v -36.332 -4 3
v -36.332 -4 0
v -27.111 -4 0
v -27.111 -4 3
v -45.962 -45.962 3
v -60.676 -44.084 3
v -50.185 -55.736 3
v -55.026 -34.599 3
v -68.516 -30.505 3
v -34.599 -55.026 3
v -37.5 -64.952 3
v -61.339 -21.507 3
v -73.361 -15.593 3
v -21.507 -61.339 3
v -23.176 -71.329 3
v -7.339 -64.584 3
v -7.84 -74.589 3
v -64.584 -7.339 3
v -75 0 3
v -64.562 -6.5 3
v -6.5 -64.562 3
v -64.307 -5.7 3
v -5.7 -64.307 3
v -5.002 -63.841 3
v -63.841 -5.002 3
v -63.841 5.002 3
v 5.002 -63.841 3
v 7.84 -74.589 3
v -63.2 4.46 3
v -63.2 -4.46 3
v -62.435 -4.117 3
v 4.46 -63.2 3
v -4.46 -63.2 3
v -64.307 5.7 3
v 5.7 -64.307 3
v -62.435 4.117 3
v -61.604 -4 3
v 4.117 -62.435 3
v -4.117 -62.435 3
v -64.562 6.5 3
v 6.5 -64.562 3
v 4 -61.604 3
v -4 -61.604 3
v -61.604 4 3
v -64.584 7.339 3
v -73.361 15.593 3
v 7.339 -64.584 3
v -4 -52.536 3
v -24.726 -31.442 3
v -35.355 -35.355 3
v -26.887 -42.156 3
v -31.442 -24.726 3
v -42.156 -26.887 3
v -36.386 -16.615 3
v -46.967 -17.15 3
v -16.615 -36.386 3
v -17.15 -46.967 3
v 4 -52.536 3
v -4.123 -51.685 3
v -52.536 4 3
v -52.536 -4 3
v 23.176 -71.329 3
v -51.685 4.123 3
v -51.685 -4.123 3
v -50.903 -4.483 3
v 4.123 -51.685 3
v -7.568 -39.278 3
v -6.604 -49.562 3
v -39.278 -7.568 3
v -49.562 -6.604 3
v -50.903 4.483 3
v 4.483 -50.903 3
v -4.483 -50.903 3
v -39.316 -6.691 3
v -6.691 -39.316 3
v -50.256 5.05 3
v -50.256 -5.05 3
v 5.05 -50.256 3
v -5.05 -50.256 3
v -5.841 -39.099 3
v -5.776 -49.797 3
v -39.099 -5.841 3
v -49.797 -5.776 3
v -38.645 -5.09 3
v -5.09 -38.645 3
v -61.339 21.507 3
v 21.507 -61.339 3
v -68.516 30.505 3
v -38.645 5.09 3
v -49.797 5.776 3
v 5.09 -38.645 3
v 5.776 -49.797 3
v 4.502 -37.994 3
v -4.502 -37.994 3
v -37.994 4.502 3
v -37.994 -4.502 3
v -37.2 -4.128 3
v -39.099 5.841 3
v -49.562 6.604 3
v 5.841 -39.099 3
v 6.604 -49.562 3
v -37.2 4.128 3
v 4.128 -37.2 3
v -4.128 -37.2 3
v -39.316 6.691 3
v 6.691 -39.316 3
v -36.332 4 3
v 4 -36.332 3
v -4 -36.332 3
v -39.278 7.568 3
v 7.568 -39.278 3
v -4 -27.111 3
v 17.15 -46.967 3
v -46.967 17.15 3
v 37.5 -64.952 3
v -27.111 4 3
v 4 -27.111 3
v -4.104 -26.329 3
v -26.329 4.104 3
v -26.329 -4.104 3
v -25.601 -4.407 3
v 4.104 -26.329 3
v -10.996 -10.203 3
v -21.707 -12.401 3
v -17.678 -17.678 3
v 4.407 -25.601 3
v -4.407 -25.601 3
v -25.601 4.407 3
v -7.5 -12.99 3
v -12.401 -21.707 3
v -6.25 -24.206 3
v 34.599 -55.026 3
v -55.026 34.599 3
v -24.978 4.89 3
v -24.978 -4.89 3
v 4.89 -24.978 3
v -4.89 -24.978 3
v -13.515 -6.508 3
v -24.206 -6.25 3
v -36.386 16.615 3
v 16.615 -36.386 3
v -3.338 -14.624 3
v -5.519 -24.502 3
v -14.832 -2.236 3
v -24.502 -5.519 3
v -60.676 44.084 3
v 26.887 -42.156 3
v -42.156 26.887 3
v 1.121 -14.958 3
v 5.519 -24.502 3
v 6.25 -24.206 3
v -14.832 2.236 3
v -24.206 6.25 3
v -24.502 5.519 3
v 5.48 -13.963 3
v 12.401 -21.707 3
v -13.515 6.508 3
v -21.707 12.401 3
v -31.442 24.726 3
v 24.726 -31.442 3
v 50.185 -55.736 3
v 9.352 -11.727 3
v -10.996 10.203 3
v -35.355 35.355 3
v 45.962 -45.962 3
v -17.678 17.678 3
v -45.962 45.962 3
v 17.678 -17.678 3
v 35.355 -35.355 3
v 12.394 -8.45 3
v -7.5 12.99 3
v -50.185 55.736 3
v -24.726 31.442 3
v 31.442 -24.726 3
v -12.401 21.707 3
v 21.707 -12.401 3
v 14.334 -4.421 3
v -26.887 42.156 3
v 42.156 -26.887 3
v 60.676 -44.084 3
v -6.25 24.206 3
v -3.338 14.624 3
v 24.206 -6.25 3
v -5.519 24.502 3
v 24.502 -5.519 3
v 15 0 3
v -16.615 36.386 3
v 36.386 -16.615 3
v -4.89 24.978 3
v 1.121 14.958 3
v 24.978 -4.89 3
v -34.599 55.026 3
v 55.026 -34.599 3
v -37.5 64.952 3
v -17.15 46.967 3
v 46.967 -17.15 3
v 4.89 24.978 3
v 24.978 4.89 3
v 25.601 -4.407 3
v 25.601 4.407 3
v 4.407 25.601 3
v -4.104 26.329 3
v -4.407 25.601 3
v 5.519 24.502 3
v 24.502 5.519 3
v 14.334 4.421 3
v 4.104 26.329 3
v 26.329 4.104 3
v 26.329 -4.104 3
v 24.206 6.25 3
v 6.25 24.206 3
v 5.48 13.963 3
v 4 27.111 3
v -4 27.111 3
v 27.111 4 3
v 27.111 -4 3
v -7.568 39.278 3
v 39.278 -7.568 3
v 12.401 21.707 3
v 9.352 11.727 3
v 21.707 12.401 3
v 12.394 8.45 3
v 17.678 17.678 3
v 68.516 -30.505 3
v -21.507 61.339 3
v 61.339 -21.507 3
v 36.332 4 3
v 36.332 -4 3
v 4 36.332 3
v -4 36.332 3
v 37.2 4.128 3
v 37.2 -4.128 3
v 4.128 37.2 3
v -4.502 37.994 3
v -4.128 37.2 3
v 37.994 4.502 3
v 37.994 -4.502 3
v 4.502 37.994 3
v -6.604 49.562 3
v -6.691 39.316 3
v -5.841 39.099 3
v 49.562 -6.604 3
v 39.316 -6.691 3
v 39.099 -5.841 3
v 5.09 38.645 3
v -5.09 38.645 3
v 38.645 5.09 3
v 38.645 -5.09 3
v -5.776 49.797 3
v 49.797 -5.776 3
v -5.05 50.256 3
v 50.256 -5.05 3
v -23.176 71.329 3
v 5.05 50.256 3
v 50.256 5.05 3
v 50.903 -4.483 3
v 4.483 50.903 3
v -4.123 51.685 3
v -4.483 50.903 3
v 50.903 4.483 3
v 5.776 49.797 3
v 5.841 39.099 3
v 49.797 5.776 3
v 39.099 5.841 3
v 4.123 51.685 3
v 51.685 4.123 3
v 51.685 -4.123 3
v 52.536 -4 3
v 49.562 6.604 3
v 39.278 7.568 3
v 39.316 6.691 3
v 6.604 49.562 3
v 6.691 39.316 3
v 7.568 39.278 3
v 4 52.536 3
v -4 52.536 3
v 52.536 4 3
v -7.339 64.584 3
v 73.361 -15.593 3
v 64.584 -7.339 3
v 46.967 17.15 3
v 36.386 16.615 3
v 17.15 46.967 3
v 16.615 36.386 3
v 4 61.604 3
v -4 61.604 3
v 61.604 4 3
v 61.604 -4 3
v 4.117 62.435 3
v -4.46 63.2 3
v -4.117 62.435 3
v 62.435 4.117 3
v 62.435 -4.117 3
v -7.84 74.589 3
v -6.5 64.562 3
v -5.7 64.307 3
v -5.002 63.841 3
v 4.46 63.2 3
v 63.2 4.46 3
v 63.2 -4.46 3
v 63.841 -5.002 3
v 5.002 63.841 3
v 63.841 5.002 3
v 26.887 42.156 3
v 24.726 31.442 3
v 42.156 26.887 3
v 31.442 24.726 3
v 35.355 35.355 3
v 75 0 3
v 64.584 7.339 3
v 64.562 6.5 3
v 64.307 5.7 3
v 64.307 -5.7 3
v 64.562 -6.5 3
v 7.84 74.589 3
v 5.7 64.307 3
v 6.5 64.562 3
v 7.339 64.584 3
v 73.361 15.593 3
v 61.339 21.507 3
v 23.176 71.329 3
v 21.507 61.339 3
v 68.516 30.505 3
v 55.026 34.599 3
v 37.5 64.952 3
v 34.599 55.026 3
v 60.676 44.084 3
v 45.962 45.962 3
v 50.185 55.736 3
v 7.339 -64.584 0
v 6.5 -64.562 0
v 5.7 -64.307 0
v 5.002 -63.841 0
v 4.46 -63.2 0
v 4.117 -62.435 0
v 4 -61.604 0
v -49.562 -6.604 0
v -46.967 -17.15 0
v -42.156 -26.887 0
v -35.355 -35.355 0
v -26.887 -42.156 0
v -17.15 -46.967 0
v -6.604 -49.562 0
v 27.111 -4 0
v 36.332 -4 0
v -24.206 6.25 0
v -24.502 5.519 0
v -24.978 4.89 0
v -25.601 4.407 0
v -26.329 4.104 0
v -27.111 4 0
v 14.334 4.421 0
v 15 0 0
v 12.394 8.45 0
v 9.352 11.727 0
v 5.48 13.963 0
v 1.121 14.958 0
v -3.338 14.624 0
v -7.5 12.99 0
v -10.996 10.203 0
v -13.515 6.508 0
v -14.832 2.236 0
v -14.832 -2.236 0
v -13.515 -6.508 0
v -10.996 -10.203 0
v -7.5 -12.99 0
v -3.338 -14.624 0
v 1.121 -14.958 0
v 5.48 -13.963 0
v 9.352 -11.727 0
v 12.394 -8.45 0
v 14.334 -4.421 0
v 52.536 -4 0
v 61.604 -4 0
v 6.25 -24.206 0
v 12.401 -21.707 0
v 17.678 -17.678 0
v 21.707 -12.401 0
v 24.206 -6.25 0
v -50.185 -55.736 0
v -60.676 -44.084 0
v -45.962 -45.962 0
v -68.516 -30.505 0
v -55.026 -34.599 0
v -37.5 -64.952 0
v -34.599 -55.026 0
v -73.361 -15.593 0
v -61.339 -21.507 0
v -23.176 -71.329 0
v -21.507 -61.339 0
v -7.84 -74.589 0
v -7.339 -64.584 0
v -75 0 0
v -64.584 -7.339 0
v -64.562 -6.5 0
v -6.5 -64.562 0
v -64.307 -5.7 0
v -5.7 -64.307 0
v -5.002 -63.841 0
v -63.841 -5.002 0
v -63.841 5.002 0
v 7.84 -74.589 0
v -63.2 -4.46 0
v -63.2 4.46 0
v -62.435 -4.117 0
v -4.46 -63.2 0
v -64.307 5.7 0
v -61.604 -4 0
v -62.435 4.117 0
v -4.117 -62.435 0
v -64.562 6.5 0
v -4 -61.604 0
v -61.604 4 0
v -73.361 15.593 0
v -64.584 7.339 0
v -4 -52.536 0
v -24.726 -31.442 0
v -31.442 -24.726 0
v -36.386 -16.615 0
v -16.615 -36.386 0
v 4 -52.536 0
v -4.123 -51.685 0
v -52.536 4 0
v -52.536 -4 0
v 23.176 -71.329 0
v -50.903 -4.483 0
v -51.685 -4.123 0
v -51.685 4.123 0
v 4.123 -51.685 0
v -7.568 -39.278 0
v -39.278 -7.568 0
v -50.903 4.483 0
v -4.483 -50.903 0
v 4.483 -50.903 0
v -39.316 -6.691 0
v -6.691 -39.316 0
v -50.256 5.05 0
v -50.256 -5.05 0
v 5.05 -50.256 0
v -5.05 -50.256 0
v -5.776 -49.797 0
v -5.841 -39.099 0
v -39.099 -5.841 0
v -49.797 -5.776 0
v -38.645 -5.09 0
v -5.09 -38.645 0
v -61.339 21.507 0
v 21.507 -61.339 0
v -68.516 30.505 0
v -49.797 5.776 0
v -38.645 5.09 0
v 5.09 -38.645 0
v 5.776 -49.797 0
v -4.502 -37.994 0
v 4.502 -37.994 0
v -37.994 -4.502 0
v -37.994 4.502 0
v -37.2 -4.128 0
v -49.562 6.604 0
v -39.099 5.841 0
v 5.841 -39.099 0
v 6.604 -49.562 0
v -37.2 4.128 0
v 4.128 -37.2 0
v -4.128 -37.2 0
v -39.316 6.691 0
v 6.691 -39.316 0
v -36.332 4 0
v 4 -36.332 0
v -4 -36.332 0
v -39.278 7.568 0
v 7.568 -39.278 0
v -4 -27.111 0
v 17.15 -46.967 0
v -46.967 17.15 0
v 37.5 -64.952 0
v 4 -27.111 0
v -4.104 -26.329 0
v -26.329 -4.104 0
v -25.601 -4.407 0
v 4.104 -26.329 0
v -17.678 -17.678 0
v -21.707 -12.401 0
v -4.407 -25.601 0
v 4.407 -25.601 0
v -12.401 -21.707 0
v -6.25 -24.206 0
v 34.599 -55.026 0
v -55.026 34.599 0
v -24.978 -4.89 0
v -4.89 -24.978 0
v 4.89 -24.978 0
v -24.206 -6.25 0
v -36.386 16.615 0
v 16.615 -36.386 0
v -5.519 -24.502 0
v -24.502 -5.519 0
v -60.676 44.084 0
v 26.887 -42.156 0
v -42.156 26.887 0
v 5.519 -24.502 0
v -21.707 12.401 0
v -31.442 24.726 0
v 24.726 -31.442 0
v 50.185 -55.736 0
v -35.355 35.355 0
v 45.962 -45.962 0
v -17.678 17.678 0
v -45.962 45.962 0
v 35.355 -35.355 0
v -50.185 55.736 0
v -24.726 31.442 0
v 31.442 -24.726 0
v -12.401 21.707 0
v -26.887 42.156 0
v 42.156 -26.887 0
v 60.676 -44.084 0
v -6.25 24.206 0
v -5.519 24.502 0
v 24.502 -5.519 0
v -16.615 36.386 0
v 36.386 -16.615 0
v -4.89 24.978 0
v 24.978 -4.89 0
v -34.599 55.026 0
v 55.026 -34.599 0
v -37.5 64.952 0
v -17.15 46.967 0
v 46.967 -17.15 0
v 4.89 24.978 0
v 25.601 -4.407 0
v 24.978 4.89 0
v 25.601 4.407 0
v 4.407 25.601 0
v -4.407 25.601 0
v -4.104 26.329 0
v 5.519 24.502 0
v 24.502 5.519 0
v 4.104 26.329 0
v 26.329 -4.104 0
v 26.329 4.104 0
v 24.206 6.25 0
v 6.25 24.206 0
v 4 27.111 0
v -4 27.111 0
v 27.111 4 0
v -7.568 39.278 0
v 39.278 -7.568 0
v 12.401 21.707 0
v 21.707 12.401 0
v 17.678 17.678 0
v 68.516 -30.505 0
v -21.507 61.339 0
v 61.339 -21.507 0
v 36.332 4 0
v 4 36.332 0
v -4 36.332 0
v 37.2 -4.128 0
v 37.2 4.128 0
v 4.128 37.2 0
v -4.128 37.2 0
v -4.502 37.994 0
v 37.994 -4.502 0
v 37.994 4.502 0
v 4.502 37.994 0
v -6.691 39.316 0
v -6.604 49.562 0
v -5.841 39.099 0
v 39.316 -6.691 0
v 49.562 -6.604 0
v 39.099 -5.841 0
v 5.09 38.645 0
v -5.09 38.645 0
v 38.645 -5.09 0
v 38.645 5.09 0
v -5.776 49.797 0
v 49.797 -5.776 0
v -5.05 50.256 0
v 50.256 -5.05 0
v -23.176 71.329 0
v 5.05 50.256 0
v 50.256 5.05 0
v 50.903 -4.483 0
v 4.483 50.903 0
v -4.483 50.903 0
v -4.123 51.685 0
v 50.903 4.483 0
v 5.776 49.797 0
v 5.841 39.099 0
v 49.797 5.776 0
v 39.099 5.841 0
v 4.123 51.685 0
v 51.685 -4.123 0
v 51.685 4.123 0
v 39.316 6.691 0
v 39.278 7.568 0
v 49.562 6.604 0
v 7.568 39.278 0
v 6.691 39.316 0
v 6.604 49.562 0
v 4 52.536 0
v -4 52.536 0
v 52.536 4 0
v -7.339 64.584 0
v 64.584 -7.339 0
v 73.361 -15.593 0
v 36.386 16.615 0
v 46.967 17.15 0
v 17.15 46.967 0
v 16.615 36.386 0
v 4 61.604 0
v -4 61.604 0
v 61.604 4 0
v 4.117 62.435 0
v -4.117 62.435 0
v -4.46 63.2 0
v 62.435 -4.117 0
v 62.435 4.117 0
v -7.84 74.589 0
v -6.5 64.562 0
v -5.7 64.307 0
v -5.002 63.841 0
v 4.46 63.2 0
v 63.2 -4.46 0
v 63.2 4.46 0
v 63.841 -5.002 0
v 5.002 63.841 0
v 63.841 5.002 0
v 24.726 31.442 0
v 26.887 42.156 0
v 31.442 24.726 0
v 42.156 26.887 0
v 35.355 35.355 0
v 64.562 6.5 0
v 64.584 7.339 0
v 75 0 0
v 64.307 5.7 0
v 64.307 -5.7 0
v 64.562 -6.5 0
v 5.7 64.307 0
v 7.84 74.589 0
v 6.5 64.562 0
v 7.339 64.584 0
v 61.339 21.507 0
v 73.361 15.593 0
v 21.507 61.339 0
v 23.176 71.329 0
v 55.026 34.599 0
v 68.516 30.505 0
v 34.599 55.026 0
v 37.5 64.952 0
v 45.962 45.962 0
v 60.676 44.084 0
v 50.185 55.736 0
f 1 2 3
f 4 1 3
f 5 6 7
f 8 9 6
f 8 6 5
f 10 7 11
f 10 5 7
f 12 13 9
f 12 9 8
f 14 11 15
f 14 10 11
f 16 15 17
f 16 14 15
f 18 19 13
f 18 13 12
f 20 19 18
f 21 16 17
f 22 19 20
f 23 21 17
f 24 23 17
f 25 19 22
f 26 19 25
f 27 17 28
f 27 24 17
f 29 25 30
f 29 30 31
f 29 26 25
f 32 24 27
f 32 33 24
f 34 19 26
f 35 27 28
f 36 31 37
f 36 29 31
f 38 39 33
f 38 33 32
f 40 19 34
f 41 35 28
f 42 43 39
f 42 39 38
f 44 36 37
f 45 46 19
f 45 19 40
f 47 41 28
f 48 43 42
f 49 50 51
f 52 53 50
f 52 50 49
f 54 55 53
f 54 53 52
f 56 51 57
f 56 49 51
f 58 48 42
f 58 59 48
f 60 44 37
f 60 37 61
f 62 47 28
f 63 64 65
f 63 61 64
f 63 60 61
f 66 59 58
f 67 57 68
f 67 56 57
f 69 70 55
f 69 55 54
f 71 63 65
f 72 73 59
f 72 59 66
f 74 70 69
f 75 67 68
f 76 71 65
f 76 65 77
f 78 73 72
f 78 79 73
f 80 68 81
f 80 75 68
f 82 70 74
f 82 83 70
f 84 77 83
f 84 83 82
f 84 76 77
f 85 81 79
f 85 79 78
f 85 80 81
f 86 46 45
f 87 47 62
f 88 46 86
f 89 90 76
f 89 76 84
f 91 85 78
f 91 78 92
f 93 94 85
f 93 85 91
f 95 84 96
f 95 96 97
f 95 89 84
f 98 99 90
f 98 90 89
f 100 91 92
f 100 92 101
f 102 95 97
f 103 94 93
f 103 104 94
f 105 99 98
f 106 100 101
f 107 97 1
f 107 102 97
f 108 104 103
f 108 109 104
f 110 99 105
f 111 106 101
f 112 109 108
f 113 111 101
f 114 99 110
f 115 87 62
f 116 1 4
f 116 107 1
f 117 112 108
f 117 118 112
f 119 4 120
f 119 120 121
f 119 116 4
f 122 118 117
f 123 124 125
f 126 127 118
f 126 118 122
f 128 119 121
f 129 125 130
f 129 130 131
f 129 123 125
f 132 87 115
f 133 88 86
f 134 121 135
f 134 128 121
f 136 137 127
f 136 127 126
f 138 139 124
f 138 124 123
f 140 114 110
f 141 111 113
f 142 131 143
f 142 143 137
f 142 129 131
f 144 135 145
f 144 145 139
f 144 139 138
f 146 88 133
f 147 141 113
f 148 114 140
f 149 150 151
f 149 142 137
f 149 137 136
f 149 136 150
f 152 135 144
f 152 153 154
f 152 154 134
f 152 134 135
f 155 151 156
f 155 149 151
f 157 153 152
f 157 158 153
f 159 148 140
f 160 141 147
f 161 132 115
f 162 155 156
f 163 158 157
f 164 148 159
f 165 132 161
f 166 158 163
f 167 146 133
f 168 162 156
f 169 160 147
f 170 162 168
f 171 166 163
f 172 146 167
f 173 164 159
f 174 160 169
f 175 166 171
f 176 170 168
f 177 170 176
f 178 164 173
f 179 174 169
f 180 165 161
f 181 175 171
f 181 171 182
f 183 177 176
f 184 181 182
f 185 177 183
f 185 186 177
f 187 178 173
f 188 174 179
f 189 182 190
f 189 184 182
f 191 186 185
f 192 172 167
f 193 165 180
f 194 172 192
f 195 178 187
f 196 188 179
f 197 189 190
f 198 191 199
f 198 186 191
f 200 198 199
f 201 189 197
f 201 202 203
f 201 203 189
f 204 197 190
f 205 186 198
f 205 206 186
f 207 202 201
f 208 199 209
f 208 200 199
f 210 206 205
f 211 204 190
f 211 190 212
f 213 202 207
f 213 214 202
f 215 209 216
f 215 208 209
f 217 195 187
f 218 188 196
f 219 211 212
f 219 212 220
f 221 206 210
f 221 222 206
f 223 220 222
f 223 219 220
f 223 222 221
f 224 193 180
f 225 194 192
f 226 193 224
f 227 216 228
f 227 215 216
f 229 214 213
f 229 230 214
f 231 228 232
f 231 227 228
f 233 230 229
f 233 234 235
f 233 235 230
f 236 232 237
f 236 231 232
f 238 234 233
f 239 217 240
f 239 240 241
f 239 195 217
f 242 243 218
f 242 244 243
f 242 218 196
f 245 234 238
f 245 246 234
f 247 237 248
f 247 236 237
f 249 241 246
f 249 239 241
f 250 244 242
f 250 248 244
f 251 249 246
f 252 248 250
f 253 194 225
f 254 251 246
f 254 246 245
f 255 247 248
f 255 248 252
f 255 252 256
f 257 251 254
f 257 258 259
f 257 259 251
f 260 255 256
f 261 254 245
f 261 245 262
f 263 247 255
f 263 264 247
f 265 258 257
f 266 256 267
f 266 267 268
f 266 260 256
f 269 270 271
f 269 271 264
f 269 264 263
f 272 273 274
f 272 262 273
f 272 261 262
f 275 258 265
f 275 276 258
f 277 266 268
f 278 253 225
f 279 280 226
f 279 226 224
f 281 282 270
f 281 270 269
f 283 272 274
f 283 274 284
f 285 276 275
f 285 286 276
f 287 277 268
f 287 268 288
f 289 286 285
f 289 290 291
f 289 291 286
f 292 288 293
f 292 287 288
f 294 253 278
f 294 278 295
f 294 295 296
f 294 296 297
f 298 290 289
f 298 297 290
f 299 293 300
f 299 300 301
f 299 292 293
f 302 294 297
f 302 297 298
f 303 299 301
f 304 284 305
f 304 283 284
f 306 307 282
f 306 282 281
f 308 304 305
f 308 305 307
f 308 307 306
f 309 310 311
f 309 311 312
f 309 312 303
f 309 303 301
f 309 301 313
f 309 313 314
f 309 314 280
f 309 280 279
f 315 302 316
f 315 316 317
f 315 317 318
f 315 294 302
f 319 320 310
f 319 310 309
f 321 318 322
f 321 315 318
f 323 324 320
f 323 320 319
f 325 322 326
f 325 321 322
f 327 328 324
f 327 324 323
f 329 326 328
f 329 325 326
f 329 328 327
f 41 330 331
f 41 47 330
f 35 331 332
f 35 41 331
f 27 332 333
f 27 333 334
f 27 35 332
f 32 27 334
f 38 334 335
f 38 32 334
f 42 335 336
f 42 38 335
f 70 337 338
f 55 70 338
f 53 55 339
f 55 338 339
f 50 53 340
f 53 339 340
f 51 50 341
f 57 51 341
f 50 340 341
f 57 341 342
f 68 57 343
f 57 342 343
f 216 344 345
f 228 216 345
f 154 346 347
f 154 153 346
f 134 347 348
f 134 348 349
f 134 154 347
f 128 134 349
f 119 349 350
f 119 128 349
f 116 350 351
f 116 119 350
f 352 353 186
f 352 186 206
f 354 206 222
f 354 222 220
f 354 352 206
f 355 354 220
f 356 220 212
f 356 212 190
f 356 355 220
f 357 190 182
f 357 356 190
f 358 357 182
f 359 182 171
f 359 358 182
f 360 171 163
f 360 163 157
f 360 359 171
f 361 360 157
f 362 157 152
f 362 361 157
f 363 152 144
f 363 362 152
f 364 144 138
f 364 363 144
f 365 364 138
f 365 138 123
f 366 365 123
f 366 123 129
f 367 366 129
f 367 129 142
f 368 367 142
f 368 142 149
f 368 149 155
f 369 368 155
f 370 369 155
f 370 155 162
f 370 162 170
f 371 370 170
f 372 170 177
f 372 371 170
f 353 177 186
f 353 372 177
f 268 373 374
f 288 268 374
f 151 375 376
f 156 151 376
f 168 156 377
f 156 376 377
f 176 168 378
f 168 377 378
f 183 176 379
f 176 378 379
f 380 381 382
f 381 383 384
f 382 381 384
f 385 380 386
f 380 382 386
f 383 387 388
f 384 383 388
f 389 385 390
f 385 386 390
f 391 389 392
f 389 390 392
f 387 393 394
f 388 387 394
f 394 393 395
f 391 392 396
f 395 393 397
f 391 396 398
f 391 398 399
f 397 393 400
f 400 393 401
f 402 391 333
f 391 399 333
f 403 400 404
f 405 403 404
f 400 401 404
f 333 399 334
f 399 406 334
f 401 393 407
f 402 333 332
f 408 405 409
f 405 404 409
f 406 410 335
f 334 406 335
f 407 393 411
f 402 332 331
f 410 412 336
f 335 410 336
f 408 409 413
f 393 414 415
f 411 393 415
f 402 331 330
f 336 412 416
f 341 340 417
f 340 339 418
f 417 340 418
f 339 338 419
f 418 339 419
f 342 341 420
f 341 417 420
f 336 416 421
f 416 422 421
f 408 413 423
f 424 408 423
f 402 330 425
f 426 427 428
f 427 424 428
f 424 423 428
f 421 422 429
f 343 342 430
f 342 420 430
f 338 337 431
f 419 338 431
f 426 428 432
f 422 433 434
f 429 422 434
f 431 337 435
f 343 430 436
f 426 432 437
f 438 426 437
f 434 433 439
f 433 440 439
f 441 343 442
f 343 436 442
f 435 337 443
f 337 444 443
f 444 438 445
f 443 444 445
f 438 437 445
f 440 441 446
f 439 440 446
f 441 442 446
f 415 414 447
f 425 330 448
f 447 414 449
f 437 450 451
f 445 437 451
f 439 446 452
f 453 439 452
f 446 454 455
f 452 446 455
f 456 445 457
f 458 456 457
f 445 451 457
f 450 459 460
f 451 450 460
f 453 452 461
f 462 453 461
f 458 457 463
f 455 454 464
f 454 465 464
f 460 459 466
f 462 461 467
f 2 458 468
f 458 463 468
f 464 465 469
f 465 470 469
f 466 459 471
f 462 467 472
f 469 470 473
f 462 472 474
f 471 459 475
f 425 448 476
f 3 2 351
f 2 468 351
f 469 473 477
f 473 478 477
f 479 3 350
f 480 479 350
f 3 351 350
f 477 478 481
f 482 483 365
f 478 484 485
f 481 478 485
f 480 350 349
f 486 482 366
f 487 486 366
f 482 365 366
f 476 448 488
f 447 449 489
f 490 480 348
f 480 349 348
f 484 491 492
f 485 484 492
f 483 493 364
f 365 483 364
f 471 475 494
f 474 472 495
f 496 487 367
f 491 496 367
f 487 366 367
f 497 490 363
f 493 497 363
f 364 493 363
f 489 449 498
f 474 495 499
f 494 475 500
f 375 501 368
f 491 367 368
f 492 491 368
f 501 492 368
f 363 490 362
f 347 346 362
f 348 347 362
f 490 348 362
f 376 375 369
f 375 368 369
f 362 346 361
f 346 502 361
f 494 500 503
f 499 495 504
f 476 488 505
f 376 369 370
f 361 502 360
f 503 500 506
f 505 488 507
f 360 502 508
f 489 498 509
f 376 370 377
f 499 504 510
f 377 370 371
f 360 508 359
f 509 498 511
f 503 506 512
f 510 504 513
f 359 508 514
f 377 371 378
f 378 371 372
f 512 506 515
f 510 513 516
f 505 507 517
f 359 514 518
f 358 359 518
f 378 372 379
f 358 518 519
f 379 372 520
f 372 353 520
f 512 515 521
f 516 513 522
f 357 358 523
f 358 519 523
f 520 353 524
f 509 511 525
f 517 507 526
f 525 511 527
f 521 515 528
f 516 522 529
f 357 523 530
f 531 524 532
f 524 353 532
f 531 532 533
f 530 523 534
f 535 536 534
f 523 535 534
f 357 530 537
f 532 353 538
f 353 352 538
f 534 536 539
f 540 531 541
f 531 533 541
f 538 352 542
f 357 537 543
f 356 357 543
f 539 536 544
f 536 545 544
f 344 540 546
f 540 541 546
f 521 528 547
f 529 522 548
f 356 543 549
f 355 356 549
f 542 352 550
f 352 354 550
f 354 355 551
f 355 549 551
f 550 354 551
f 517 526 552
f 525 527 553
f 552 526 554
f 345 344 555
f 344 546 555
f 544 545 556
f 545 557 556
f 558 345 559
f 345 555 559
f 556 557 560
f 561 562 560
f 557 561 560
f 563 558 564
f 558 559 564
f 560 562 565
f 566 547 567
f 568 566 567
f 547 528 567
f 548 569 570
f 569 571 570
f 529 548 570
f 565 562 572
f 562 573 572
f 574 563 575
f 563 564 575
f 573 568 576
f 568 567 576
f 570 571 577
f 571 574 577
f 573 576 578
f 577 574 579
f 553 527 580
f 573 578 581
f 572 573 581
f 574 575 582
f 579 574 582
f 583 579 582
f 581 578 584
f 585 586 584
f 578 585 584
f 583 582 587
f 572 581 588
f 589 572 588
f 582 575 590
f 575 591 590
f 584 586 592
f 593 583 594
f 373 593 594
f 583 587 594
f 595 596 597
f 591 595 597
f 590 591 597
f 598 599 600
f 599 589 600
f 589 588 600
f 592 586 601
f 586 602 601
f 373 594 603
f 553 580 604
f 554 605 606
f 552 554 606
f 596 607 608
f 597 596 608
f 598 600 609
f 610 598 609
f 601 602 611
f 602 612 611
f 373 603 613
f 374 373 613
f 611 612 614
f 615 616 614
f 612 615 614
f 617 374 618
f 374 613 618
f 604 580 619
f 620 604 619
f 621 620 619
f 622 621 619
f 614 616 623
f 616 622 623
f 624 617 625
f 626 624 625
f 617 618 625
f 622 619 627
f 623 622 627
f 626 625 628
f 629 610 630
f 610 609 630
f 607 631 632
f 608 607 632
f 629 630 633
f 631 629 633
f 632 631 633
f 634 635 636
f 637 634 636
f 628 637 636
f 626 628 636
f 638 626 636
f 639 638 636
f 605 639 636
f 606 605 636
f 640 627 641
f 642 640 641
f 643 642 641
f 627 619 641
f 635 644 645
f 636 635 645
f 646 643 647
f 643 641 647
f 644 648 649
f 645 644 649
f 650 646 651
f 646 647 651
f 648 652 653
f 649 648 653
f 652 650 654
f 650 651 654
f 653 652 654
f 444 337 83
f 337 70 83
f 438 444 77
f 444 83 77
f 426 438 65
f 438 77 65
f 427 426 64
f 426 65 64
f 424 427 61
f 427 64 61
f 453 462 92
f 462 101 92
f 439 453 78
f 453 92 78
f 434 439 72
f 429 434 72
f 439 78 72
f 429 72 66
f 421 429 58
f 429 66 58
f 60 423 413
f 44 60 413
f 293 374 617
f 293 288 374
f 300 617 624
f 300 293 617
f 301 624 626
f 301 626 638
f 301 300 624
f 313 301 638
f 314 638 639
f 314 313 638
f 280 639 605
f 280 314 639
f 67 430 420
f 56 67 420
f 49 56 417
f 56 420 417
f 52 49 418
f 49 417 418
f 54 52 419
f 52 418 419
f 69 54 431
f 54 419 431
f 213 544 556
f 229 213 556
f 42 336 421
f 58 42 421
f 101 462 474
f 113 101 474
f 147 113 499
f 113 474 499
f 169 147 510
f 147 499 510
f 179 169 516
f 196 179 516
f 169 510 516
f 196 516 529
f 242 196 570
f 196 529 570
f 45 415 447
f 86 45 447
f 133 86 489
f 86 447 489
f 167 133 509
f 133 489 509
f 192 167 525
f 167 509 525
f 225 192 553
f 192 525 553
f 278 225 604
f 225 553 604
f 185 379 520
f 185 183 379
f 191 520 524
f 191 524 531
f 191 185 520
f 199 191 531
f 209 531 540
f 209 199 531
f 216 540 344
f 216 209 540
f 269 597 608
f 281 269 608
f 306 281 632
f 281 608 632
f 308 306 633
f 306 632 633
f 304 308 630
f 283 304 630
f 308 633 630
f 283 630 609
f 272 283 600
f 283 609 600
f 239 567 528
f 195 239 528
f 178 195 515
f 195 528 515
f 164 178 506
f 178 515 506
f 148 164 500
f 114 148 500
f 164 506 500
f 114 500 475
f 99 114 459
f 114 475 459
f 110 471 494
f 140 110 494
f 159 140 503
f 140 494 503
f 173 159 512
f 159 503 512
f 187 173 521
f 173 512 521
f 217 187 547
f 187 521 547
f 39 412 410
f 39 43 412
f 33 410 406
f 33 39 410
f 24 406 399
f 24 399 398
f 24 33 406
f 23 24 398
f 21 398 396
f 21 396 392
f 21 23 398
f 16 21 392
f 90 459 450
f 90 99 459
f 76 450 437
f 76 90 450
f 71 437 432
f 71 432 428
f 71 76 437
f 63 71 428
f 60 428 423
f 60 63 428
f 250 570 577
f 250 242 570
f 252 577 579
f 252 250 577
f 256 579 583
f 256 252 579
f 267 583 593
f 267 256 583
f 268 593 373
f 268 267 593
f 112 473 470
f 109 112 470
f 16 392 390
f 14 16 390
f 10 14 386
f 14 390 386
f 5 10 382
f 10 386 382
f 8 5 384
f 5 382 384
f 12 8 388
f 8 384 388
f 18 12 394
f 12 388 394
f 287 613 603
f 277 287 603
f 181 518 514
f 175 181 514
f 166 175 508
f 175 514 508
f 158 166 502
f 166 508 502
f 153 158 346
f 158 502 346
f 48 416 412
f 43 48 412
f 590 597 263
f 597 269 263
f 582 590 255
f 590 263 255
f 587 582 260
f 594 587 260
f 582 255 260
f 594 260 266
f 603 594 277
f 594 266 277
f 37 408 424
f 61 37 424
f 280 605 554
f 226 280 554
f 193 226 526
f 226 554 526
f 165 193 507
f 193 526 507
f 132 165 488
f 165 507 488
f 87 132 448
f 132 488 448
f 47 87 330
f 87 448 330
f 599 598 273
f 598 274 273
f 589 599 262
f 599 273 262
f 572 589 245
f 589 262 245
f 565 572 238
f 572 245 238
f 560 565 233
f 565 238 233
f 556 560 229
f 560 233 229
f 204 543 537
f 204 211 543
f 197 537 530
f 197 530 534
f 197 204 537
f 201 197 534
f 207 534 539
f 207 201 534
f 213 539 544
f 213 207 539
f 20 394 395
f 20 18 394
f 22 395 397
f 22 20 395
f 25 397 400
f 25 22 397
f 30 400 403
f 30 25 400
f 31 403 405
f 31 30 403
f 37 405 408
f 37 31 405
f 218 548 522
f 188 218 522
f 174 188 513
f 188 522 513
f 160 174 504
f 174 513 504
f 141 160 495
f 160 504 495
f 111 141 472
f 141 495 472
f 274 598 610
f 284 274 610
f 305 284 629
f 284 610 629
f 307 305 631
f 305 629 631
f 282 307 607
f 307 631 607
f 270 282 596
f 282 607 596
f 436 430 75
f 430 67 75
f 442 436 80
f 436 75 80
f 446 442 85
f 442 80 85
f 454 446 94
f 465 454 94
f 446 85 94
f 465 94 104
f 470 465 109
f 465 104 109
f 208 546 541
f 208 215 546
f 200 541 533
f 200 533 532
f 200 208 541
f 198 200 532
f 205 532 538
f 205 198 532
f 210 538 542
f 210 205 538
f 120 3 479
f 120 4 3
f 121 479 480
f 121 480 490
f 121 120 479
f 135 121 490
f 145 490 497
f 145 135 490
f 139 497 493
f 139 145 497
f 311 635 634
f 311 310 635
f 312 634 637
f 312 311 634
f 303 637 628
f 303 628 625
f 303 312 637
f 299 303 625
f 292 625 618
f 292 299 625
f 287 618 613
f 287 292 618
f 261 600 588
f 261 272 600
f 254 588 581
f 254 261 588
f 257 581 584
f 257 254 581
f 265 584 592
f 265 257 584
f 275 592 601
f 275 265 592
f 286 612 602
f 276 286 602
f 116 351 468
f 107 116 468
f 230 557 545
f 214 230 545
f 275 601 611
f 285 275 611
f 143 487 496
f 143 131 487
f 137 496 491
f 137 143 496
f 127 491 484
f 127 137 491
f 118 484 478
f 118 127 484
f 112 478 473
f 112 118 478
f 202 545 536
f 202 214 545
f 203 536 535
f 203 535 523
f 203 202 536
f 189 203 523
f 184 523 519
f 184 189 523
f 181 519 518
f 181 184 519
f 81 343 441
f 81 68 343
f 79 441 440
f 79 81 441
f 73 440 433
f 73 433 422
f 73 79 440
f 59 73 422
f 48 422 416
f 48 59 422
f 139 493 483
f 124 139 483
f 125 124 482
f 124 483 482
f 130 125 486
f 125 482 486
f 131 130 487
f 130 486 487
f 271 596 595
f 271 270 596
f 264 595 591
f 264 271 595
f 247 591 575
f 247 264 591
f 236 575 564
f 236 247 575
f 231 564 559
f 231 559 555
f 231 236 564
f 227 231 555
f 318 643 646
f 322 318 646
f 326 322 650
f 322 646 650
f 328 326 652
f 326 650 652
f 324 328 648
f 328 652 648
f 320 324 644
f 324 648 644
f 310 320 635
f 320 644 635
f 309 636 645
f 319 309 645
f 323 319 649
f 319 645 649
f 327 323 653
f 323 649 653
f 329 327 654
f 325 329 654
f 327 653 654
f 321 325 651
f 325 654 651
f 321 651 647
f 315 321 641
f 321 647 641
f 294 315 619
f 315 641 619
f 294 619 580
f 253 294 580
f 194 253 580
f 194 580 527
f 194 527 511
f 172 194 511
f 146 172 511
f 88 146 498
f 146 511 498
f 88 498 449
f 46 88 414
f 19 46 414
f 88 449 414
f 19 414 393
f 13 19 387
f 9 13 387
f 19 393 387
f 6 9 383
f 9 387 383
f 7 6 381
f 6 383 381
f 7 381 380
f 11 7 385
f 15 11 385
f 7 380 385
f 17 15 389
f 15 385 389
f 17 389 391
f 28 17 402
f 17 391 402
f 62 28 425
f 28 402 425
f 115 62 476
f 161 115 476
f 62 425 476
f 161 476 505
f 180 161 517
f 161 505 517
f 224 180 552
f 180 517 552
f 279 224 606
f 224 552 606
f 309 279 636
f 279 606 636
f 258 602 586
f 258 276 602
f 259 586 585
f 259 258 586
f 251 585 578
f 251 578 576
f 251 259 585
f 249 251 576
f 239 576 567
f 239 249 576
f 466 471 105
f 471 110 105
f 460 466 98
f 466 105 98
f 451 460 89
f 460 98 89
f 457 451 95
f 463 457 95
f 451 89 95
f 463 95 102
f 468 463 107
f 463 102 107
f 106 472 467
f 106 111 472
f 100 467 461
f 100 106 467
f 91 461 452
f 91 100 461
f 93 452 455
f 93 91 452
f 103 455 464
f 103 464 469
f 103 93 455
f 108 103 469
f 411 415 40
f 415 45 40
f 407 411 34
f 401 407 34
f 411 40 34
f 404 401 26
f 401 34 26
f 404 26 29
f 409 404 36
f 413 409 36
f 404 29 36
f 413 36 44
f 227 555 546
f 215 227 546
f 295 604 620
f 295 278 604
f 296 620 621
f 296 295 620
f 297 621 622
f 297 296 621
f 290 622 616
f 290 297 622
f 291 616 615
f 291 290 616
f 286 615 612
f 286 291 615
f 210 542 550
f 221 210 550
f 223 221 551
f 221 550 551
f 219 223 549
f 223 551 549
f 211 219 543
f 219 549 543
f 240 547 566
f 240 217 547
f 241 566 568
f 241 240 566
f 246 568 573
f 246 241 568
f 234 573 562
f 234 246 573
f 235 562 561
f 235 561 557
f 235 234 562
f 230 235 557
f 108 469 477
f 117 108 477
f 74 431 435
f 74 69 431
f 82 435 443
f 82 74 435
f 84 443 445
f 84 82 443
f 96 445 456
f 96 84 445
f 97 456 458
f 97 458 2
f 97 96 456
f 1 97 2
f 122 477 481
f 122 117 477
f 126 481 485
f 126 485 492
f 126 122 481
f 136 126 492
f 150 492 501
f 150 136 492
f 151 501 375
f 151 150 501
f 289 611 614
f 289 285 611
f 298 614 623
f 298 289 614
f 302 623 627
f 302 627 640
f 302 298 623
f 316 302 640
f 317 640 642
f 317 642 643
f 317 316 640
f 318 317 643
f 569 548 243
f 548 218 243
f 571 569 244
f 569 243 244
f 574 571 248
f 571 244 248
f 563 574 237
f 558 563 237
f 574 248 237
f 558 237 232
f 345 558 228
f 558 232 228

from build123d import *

# Parameters (mm, degrees)
F0_R     = 75
F0_R_2   = 15
F1_DEPTH = 3
F2_R     = 3


with BuildPart() as f1:
    # F0 (on Top) → F1 (new body)
    with BuildSketch(Plane.XY):
        Circle(F0_R)
        with BuildLine():
            ThreePointArc((4, 64.876806), (45.961941, 45.961941), (64.876806, 4))
            ThreePointArc((64.876806, 4), (64.969194, 2.000948), (65, 0))
            ThreePointArc((65, 0), (64.969194, -2.000948), (64.876806, -4))
            ThreePointArc((64.876806, -4), (45.961941, -45.961941), (4, -64.876806))
            ThreePointArc((4, -64.876806), (0, -65), (-4, -64.876806))
            ThreePointArc((-4, -64.876806), (-45.961941, -45.961941), (-64.876806, -4))
            ThreePointArc((-64.876806, -4), (-65, 0), (-64.876806, 4))
            ThreePointArc((-64.876806, 4), (-45.961941, 45.961941), (-4, 64.876806))
            ThreePointArc((-4, 64.876806), (0, 65), (4, 64.876806))
        make_face(mode=Mode.SUBTRACT)
        with BuildLine():
            ThreePointArc((-4, 49.839743), (0, 50), (4, 49.839743))
            Line((4, 49.839743), (4, 64.876806))
            ThreePointArc((4, 64.876806), (0, 65), (-4, 64.876806))
            Line((-4, 64.876806), (-4, 49.839743))
        make_face()
        with BuildLine():
            ThreePointArc((49.839743, -4), (49.95992, -2.001604), (50, 0))
            ThreePointArc((50, 0), (49.95992, 2.001604), (49.839743, 4))
            ThreePointArc((49.839743, 4), (35.355339, 35.355339), (4, 49.839743))
            ThreePointArc((4, 49.839743), (0, 50), (-4, 49.839743))
            ThreePointArc((-4, 49.839743), (-35.355339, 35.355339), (-49.839743, 4))
            ThreePointArc((-49.839743, 4), (-50, 0), (-49.839743, -4))
            ThreePointArc((-49.839743, -4), (-35.355339, -35.355339), (-4, -49.839743))
            ThreePointArc((-4, -49.839743), (0, -50), (4, -49.839743))
            ThreePointArc((4, -49.839743), (35.355339, -35.355339), (49.839743, -4))
        make_face()
        with BuildLine():
            ThreePointArc((39.799497, 4), (39.949843, 2.002511), (40, 0))
            ThreePointArc((40, 0), (39.949843, -2.002511), (39.799497, -4))
            ThreePointArc((39.799497, -4), (28.284271, -28.284271), (4, -39.799497))
            ThreePointArc((4, -39.799497), (0, -40), (-4, -39.799497))
            ThreePointArc((-4, -39.799497), (-28.284271, -28.284271), (-39.799497, -4))
            ThreePointArc((-39.799497, -4), (-40, 0), (-39.799497, 4))
            ThreePointArc((-39.799497, 4), (-28.284271, 28.284271), (-4, 39.799497))
            ThreePointArc((-4, 39.799497), (0, 40), (4, 39.799497))
            ThreePointArc((4, 39.799497), (28.284271, 28.284271), (39.799497, 4))
        make_face(mode=Mode.SUBTRACT)
        with BuildLine():
            Line((4, 24.677925), (4, 39.799497))
            ThreePointArc((4, 39.799497), (0, 40), (-4, 39.799497))
            Line((-4, 39.799497), (-4, 24.677925))
            ThreePointArc((-4, 24.677925), (0, 25), (4, 24.677925))
        make_face()
        with BuildLine():
            ThreePointArc((25, 0), (24.919351, 2.006473), (24.677925, 4))
            ThreePointArc((24.677925, 4), (17.67767, 17.67767), (4, 24.677925))
            ThreePointArc((4, 24.677925), (0, 25), (-4, 24.677925))
            ThreePointArc((-4, 24.677925), (-17.67767, 17.67767), (-24.677925, 4))
            ThreePointArc((-24.677925, 4), (-25, 0), (-24.677925, -4))
            ThreePointArc((-24.677925, -4), (-17.67767, -17.67767), (-4, -24.677925))
            ThreePointArc((-4, -24.677925), (0, -25), (4, -24.677925))
            ThreePointArc((4, -24.677925), (17.67767, -17.67767), (24.677925, -4))
            ThreePointArc((24.677925, -4), (24.919351, -2.006473), (25, 0))
        make_face()
        Circle(F0_R_2, mode=Mode.SUBTRACT)
        with BuildLine():
            Line((-24.677925, 4), (-39.799497, 4))
            ThreePointArc((-39.799497, 4), (-40, 0), (-39.799497, -4))
            Line((-39.799497, -4), (-24.677925, -4))
            ThreePointArc((-24.677925, -4), (-25, 0), (-24.677925, 4))
        make_face()
        with BuildLine():
            ThreePointArc((-49.839743, -4), (-50, 0), (-49.839743, 4))
            Line((-49.839743, 4), (-64.876806, 4))
            ThreePointArc((-64.876806, 4), (-65, 0), (-64.876806, -4))
            Line((-64.876806, -4), (-49.839743, -4))
        make_face()
        with BuildLine():
            ThreePointArc((-4, -39.799497), (0, -40), (4, -39.799497))
            Line((4, -39.799497), (4, -24.677925))
            ThreePointArc((4, -24.677925), (0, -25), (-4, -24.677925))
            Line((-4, -24.677925), (-4, -39.799497))
        make_face()
        with BuildLine():
            Line((4, -64.876806), (4, -49.839743))
            ThreePointArc((4, -49.839743), (0, -50), (-4, -49.839743))
            Line((-4, -49.839743), (-4, -64.876806))
            ThreePointArc((-4, -64.876806), (0, -65), (4, -64.876806))
        make_face()
        with BuildLine():
            ThreePointArc((39.799497, -4), (39.949843, -2.002511), (40, 0))
            ThreePointArc((40, 0), (39.949843, 2.002511), (39.799497, 4))
            Line((39.799497, 4), (24.677925, 4))
            ThreePointArc((24.677925, 4), (24.919351, 2.006473), (25, 0))
            ThreePointArc((25, 0), (24.919351, -2.006473), (24.677925, -4))
            Line((24.677925, -4), (39.799497, -4))
        make_face()
        with BuildLine():
            ThreePointArc((49.839743, 4), (49.95992, 2.001604), (50, 0))
            ThreePointArc((50, 0), (49.95992, -2.001604), (49.839743, -4))
            Line((49.839743, -4), (64.876806, -4))
            ThreePointArc((64.876806, -4), (64.969194, -2.000948), (65, 0))
            ThreePointArc((65, 0), (64.969194, 2.000948), (64.876806, 4))
            Line((64.876806, 4), (49.839743, 4))
        make_face()
    extrude(amount=F1_DEPTH)

    # F2
    f2_edges = [f1.edges().sort_by_distance(p)[0] for p in [
        (-64.876806, 4, 1.5),
        (-39.799497, 4, 1.5),
        (4, 24.677925, 1.5),
        (49.839743, 4, 1.5),
        (24.677925, 4, 1.5),
        (4, -39.799497, 1.5),
        (4, -64.876806, 1.5),
        (4, 49.839743, 1.5),
        (64.876806, -4, 1.5),
        (39.799497, -4, 1.5),
        (-4, 39.799497, 1.5),
        (-4, -24.677925, 1.5),
        (-4, -49.839743, 1.5),
        (-49.839743, -4, 1.5),
        (-4, 64.876806, 1.5),
        (4, 64.876806, 1.5),
        (-64.876806, -4, 1.5),
        (-39.799497, -4, 1.5),
        (24.677925, -4, 1.5),
        (49.839743, -4, 1.5),
        (4, -49.839743, 1.5),
        (-4, -64.876806, 1.5),
        (-4, -39.799497, 1.5),
        (-24.677925, 4, 1.5),
        (39.799497, 4, 1.5),
        (64.876806, 4, 1.5),
        (-4, 24.677925, 1.5),
        (-4, 49.839743, 1.5),
        (-49.839743, 4, 1.5),
        (4, -24.677925, 1.5),
        (4, 39.799497, 1.5),
        (-24.677925, -4, 1.5),
    ]]
    fillet(f2_edges, radius=F2_R)


solid = f1.part
